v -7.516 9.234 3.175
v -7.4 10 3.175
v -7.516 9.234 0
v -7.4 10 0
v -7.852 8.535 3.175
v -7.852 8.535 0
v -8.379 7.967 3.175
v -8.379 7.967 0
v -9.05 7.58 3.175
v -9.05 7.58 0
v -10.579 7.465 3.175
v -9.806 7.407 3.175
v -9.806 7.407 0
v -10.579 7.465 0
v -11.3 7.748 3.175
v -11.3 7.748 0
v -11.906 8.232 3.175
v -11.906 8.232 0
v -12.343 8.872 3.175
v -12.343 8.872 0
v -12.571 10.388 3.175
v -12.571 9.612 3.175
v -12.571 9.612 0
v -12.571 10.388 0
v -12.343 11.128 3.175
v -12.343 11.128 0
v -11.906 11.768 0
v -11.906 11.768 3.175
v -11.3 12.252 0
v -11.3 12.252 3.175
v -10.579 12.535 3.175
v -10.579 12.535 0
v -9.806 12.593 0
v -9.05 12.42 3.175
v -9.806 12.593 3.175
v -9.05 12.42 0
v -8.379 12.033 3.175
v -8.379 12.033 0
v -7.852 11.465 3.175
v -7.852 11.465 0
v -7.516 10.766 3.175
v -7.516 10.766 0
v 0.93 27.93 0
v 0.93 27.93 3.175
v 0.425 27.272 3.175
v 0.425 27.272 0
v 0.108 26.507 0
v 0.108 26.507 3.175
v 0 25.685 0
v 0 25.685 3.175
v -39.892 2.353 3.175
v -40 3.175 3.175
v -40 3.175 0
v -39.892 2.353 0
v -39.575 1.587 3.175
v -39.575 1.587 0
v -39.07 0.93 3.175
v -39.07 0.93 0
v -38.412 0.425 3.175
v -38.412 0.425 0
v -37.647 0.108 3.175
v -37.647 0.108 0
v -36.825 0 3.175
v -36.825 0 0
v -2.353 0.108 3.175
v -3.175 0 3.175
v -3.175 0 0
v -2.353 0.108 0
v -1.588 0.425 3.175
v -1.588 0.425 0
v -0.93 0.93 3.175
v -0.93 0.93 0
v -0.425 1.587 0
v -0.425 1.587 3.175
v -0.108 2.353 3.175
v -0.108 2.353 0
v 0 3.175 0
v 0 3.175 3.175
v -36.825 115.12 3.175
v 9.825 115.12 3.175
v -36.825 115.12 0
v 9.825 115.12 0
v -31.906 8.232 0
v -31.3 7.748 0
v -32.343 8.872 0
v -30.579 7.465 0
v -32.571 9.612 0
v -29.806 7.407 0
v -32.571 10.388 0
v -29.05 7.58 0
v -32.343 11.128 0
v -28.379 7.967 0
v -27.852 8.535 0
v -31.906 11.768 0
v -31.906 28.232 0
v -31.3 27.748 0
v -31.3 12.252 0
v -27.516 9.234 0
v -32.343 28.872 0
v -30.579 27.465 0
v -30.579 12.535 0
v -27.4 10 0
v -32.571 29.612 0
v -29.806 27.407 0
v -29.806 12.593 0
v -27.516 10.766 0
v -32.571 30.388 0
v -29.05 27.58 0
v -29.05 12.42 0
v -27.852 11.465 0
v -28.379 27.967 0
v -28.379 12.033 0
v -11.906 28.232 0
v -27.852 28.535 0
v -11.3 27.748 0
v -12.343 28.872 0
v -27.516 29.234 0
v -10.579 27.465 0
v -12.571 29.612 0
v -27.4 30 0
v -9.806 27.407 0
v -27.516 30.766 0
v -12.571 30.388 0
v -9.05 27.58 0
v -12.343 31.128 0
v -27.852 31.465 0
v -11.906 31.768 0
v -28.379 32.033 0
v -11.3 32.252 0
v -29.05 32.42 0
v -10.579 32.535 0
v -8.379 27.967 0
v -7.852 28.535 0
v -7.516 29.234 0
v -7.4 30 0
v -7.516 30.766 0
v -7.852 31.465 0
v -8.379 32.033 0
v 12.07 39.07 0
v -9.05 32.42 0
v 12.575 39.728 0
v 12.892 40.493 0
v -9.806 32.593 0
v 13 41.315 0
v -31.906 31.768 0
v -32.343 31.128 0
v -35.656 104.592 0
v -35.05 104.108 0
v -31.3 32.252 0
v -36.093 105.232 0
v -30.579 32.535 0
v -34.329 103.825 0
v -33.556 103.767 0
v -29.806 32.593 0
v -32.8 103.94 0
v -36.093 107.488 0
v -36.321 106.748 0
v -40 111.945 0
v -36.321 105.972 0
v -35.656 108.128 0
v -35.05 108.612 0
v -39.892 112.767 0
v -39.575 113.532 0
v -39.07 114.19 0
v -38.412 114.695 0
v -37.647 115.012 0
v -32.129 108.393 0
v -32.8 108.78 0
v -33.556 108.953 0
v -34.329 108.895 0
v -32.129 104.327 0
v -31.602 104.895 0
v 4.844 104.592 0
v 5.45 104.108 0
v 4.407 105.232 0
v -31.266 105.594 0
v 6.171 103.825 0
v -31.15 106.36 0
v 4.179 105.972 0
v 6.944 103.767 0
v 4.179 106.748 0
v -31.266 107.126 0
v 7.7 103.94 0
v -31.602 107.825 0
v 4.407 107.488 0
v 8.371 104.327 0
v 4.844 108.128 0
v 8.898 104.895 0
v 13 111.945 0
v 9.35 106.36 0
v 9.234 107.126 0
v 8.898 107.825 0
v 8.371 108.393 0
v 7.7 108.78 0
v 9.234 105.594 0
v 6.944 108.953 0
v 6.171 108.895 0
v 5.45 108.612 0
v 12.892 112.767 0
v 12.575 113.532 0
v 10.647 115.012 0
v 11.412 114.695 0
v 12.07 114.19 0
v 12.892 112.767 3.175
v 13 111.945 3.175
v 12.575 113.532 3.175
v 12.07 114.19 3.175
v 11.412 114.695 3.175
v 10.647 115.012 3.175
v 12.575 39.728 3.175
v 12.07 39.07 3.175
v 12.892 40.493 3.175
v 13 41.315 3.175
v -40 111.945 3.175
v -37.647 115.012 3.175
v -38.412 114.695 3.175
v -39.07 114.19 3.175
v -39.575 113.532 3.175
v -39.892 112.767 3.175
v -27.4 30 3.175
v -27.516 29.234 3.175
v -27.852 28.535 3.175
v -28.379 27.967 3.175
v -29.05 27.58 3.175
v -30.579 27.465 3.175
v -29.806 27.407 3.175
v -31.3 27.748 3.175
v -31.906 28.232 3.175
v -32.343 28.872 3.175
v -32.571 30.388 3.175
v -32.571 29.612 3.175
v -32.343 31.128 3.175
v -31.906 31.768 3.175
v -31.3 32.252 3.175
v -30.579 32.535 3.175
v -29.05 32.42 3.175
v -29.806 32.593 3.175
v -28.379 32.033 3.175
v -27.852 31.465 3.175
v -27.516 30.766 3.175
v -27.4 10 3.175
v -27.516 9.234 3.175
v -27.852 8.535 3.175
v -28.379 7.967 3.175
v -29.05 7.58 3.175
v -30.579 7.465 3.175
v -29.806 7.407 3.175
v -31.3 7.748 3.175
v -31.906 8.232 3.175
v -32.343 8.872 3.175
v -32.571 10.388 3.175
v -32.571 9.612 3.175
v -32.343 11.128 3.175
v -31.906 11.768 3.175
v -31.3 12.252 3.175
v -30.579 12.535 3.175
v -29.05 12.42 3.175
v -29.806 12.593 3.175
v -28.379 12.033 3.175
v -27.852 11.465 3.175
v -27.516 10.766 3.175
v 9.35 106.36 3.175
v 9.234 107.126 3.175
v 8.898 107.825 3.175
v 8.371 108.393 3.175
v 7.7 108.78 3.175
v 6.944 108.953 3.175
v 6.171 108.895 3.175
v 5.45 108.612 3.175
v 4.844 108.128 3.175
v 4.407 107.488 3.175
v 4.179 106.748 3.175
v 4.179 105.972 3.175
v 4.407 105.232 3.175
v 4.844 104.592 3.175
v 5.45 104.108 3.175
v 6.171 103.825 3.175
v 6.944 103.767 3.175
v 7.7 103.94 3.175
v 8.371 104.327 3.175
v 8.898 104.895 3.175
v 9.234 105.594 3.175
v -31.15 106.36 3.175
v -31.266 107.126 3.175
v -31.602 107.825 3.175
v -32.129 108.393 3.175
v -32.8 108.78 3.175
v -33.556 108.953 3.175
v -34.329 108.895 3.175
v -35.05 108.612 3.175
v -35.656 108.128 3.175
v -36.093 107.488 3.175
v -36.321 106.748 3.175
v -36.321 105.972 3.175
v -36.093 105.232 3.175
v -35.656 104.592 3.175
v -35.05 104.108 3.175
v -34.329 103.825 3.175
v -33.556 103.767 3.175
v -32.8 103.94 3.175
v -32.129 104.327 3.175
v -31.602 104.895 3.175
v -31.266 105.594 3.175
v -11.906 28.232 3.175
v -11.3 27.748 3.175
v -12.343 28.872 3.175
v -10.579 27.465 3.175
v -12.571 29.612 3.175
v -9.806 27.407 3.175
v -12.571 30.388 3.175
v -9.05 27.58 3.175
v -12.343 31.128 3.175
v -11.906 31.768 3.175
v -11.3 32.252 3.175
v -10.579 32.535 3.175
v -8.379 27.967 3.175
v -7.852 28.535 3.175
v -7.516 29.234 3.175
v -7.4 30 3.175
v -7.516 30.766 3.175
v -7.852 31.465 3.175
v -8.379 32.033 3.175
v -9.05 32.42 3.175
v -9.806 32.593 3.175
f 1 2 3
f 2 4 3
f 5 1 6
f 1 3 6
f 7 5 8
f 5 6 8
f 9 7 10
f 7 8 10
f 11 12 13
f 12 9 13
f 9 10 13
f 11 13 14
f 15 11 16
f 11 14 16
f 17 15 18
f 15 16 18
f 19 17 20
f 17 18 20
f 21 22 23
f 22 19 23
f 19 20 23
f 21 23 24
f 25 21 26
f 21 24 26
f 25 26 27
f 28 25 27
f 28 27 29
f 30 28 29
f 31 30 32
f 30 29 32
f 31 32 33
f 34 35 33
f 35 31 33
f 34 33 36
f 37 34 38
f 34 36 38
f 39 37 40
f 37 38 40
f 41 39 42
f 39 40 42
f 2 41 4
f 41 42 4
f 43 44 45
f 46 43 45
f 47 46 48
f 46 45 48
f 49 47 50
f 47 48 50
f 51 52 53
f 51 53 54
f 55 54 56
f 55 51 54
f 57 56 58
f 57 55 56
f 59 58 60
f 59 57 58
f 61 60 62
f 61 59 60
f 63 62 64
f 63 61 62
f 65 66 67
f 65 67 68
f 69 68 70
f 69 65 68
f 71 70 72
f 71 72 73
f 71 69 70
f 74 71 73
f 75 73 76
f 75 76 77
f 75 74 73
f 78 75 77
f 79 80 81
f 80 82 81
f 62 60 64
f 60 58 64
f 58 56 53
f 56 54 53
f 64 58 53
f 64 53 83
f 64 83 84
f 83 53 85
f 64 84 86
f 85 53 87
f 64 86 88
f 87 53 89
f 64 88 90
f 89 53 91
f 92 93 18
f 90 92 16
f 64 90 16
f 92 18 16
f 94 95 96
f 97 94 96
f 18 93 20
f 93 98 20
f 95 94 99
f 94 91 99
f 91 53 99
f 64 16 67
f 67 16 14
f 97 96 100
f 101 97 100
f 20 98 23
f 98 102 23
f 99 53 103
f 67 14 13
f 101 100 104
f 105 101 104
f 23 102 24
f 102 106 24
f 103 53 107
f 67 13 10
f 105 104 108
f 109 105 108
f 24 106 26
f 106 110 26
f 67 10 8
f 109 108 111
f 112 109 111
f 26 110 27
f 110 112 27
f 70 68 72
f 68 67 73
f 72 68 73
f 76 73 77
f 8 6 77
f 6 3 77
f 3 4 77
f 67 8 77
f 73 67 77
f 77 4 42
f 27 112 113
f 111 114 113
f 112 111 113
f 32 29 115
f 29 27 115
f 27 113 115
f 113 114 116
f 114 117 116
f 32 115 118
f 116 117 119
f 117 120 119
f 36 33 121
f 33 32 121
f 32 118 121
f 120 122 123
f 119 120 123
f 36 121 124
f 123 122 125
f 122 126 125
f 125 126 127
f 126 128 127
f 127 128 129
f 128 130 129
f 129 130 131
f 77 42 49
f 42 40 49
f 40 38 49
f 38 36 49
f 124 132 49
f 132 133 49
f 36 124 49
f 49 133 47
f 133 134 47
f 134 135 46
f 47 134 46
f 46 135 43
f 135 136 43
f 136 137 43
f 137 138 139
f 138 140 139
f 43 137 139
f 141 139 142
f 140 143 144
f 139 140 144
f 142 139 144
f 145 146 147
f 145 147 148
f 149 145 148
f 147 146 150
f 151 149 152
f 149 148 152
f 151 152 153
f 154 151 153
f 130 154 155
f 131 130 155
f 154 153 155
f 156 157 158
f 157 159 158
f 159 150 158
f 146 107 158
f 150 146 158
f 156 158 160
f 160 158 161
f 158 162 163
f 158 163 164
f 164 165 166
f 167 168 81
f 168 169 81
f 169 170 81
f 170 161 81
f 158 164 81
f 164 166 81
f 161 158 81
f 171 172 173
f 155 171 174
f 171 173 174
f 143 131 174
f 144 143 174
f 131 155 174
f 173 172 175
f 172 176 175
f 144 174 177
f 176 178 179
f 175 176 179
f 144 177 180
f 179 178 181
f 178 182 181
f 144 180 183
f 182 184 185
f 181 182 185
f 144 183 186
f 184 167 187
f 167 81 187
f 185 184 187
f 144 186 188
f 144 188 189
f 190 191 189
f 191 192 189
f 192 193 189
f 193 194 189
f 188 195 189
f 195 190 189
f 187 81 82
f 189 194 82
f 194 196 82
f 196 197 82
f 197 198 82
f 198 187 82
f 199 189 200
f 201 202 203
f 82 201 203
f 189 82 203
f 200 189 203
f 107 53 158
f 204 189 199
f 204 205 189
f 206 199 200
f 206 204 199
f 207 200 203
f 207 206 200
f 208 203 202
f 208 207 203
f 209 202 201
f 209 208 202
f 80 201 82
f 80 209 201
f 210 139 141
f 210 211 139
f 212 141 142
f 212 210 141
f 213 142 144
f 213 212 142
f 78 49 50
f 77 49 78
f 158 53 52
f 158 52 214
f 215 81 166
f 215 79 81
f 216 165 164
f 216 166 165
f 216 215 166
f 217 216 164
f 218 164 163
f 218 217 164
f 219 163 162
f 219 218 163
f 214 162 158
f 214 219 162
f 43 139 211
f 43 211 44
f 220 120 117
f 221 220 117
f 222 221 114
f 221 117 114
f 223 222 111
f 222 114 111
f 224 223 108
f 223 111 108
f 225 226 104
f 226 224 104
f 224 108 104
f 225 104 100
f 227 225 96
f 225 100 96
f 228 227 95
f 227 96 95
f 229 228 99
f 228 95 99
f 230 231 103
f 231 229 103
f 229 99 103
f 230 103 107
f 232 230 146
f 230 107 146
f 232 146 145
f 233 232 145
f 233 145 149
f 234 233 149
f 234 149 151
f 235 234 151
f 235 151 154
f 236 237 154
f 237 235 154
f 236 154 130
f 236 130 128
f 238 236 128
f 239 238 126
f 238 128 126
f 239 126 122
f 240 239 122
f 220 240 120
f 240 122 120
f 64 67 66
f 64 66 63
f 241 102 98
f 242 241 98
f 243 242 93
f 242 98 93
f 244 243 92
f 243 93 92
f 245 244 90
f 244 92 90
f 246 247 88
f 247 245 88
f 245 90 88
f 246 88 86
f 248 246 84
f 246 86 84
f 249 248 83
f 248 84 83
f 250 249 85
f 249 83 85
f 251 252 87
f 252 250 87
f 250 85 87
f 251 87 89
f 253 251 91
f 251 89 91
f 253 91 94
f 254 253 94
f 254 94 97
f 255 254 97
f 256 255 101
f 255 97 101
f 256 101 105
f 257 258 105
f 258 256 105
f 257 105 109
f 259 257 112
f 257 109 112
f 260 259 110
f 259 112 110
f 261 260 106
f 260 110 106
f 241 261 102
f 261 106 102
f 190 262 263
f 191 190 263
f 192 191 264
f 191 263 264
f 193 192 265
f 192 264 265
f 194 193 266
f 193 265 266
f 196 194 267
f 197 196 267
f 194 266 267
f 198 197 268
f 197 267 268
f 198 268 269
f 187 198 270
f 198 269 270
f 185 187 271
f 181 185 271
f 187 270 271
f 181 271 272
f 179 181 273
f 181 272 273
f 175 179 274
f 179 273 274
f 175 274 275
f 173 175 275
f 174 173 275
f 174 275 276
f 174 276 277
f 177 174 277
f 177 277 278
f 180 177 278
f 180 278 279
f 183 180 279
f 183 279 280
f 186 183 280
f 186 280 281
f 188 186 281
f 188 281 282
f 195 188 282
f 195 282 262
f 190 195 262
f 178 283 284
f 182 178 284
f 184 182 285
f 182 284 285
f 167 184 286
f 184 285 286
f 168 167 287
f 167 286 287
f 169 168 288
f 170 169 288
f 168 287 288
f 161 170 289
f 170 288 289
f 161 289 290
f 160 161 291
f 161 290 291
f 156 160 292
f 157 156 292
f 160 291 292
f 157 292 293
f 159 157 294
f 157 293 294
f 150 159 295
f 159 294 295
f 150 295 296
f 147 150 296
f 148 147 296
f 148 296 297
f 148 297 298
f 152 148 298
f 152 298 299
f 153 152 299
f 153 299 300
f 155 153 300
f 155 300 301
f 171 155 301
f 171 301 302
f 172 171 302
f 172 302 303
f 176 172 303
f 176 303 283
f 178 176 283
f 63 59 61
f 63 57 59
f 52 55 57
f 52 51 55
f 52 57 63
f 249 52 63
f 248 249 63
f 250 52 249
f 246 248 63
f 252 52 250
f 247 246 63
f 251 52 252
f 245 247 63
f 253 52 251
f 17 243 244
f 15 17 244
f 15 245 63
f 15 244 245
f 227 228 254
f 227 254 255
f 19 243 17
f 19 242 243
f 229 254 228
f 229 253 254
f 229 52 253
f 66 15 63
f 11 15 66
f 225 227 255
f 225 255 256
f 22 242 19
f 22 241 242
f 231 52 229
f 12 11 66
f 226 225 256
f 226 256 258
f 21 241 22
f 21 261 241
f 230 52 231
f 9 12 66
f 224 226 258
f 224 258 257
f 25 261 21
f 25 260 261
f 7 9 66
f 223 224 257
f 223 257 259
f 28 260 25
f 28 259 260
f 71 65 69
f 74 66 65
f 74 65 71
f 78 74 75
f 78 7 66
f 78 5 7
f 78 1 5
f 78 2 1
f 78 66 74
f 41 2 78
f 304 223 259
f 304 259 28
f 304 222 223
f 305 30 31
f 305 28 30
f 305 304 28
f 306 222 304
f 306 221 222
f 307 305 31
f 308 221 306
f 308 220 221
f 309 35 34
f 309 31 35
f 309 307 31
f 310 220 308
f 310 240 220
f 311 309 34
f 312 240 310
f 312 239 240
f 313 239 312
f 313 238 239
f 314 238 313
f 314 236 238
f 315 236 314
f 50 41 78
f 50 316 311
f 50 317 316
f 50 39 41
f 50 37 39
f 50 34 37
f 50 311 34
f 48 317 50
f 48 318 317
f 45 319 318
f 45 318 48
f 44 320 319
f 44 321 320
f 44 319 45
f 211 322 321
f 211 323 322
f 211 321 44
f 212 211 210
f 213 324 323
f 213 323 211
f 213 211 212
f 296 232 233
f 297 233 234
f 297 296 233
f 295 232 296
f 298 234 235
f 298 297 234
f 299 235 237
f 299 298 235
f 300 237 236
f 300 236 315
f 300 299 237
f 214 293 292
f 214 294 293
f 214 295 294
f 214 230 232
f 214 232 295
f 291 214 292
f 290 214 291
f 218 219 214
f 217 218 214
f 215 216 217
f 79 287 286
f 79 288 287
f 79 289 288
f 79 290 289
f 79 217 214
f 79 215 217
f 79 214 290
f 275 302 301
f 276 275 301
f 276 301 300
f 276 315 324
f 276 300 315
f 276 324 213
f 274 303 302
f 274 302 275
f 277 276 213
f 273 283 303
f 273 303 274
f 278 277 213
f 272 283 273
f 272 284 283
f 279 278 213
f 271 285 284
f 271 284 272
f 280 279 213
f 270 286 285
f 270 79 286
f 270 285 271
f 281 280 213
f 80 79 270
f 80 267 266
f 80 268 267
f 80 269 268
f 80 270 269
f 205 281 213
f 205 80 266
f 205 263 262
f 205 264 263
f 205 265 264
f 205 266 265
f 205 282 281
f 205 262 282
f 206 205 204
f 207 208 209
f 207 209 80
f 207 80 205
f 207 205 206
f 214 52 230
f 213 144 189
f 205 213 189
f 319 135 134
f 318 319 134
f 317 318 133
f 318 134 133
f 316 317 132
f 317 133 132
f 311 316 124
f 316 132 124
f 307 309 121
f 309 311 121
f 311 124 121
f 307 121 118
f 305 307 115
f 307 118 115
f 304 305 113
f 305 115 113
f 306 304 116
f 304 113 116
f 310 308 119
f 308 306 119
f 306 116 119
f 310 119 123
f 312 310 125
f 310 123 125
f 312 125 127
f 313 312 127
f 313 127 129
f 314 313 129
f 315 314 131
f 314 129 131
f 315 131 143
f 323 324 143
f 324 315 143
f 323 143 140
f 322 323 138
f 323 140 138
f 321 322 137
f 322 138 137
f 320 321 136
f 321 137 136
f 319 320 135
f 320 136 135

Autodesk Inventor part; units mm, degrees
ref_plane "YZ Plane" through (0, 0, 0) normal (1, 0, 0) x (0, 1, 0)
ref_plane "XZ Plane" through (0, 0, 0) normal (0, 1, 0) x (-1, 0, 0)
ref_plane "XY Plane" through (0, 0, 0) normal (0, 0, 1) x (1, 0, 0)
sketch "Sketch1" plane through (0, 0, 0) normal (0, 0, 1) x (1, 0, 0)
  line L0 (0, 0) -> (-40, 0)
  line L1 (-40, 0) -> (-40, 40)
  line L2 (-40, 40) -> (0, 40)
  line L3 (0, 40) -> (0, 0)
  line L4 (-30, 30) -> (-10, 30) construction
  line L5 (-10, 30) -> (-10, 10) construction
  line L6 (-10, 10) -> (-30, 10) construction
  line L7 (-30, 10) -> (-30, 30) construction
  line L8 (-30, 30) -> (-40, 30) construction
  line L9 (-10, 10) -> (0, 10) construction
  circle A0 centre (-30, 30) radius 2.6
  circle A1 centre (-10, 30) radius 2.6
  circle A2 centre (-10, 10) radius 2.6
  circle A3 centre (-30, 10) radius 2.6
  line L10 (-40, 40) -> (13, 40)
  line L11 (13, 40) -> (13, 102.4)
  line L12 (13, 102.4) -> (-40, 102.4)
  line L13 (-40, 102.4) -> (-40, 40)
  line L14 (13, 40) -> (0, 27)
  line L15 (-40, 102.4) -> (13, 102.4)
  line L16 (13, 102.4) -> (13, 122.4)
  line L17 (-40, 122.4) -> (-40, 102.4)
  line L18 (6.75, 122.4) -> (6.75, 115.12)
  line L19 (6.75, 115.12) -> (-33.75, 115.12)
  line L20 (-33.75, 115.12) -> (-33.75, 122.4)
  line L21 (-33.75, 115.12) -> (-40, 115.12)
  line L22 (6.75, 115.12) -> (13, 115.12)
  line L23 (-40, 122.4) -> (-33.75, 122.4)
  line L24 (13, 122.4) -> (6.75, 122.4)
  line L25 (-13.5, 115.12) -> (-13.5, 113.62) construction
  arc A4 (-18.2697, 115.12) -> (-8.7303, 115.12) centre (-13.5, 113.62) ccw
  dimension "d0" = 40
  dimension "d1" = 40
  dimension "d2" = 5.2
  dimension "d3" = 5.2
  dimension "d4" = 5.2
  dimension "d5" = 5.2
  dimension "d6" = 20
  dimension "d7" = 20
  dimension "d8" = 10
  dimension "d9" = 62.4
  dimension "d10" = 53
  dimension "d11" = 45
  dimension "d12" = 20
  dimension "d13" = 40.5
  dimension "d14" = 7.28
  dimension "d15" = 1.5
  dimension "d16" = 10
  dimension "d17" = 20
extrude "Extrusion1" add sketch "Sketch1" along normal blind 3.175 contours L0 L1 L2 L3 | L3 L10 L14 | L13 L12 L11 L10 L2 | L17 L21 L19 A4 L22 L16 L12 | L19 A4
fillet "Fillet1" radius 3.175 6 edges at (0, 0, 1.5875) (-40, 0, 1.5875) (0, 27, 1.5875) (13, 40, 1.5875) (-40, 115.12, 1.5875) (13, 115.12, 1.5875)
sketch "Sketch2" plane through (0, 0, 3.175) normal (0, 0, 1) x (1, 0, 0)
  line L0 (13, 41.3151) -> (13, 111.945) construction
  line L1 (-40, 118.604) -> (13, 118.604) construction
  line L2 (13, 118.604) -> (13, 98.604) construction
  line L3 (13, 98.604) -> (-40, 98.604) construction
  line L4 (-40, 98.604) -> (-40, 118.604) construction
  circle A0 centre (-33.75, 106.36) radius 2.6
  circle A1 centre (6.75, 106.36) radius 2.6
  line L5 (9.825, 115.12) -> (-36.825, 115.12) construction
  line L6 (-33.75, 106.36) -> (-33.75, 115.12) construction
  line L7 (9.825, 115.12) -> (-36.825, 115.12) construction
  line L8 (6.75, 106.36) -> (6.75, 115.12) construction
  point P0 (0, 0)
  point P1 (13, 121.9)
  point P2 (-18.2697, 115.12)
  point P3 (-8.7303, 115.12)
  point P4 (13, 115.12)
  point P5 (-40, 115.12)
  dimension "d22" = 20
  dimension "d23" = 5.2
  dimension "d24" = 5.2
  dimension "d25" = 8.76
  dimension "d26" = 8.76
  dimension "d29" = 3.484
extrude "Extrusion2" cut sketch "Sketch2" against normal up to next
equation "\"d3\" = d2"
equation "\"d4\" = d2"
equation "\"d5\" = d2"
equation "\"d24\" = d23"
equation "\"d26\" = d25"
properties part number "X Axis Statonary NON ADJUSTABLE Composite Belt Holder"
